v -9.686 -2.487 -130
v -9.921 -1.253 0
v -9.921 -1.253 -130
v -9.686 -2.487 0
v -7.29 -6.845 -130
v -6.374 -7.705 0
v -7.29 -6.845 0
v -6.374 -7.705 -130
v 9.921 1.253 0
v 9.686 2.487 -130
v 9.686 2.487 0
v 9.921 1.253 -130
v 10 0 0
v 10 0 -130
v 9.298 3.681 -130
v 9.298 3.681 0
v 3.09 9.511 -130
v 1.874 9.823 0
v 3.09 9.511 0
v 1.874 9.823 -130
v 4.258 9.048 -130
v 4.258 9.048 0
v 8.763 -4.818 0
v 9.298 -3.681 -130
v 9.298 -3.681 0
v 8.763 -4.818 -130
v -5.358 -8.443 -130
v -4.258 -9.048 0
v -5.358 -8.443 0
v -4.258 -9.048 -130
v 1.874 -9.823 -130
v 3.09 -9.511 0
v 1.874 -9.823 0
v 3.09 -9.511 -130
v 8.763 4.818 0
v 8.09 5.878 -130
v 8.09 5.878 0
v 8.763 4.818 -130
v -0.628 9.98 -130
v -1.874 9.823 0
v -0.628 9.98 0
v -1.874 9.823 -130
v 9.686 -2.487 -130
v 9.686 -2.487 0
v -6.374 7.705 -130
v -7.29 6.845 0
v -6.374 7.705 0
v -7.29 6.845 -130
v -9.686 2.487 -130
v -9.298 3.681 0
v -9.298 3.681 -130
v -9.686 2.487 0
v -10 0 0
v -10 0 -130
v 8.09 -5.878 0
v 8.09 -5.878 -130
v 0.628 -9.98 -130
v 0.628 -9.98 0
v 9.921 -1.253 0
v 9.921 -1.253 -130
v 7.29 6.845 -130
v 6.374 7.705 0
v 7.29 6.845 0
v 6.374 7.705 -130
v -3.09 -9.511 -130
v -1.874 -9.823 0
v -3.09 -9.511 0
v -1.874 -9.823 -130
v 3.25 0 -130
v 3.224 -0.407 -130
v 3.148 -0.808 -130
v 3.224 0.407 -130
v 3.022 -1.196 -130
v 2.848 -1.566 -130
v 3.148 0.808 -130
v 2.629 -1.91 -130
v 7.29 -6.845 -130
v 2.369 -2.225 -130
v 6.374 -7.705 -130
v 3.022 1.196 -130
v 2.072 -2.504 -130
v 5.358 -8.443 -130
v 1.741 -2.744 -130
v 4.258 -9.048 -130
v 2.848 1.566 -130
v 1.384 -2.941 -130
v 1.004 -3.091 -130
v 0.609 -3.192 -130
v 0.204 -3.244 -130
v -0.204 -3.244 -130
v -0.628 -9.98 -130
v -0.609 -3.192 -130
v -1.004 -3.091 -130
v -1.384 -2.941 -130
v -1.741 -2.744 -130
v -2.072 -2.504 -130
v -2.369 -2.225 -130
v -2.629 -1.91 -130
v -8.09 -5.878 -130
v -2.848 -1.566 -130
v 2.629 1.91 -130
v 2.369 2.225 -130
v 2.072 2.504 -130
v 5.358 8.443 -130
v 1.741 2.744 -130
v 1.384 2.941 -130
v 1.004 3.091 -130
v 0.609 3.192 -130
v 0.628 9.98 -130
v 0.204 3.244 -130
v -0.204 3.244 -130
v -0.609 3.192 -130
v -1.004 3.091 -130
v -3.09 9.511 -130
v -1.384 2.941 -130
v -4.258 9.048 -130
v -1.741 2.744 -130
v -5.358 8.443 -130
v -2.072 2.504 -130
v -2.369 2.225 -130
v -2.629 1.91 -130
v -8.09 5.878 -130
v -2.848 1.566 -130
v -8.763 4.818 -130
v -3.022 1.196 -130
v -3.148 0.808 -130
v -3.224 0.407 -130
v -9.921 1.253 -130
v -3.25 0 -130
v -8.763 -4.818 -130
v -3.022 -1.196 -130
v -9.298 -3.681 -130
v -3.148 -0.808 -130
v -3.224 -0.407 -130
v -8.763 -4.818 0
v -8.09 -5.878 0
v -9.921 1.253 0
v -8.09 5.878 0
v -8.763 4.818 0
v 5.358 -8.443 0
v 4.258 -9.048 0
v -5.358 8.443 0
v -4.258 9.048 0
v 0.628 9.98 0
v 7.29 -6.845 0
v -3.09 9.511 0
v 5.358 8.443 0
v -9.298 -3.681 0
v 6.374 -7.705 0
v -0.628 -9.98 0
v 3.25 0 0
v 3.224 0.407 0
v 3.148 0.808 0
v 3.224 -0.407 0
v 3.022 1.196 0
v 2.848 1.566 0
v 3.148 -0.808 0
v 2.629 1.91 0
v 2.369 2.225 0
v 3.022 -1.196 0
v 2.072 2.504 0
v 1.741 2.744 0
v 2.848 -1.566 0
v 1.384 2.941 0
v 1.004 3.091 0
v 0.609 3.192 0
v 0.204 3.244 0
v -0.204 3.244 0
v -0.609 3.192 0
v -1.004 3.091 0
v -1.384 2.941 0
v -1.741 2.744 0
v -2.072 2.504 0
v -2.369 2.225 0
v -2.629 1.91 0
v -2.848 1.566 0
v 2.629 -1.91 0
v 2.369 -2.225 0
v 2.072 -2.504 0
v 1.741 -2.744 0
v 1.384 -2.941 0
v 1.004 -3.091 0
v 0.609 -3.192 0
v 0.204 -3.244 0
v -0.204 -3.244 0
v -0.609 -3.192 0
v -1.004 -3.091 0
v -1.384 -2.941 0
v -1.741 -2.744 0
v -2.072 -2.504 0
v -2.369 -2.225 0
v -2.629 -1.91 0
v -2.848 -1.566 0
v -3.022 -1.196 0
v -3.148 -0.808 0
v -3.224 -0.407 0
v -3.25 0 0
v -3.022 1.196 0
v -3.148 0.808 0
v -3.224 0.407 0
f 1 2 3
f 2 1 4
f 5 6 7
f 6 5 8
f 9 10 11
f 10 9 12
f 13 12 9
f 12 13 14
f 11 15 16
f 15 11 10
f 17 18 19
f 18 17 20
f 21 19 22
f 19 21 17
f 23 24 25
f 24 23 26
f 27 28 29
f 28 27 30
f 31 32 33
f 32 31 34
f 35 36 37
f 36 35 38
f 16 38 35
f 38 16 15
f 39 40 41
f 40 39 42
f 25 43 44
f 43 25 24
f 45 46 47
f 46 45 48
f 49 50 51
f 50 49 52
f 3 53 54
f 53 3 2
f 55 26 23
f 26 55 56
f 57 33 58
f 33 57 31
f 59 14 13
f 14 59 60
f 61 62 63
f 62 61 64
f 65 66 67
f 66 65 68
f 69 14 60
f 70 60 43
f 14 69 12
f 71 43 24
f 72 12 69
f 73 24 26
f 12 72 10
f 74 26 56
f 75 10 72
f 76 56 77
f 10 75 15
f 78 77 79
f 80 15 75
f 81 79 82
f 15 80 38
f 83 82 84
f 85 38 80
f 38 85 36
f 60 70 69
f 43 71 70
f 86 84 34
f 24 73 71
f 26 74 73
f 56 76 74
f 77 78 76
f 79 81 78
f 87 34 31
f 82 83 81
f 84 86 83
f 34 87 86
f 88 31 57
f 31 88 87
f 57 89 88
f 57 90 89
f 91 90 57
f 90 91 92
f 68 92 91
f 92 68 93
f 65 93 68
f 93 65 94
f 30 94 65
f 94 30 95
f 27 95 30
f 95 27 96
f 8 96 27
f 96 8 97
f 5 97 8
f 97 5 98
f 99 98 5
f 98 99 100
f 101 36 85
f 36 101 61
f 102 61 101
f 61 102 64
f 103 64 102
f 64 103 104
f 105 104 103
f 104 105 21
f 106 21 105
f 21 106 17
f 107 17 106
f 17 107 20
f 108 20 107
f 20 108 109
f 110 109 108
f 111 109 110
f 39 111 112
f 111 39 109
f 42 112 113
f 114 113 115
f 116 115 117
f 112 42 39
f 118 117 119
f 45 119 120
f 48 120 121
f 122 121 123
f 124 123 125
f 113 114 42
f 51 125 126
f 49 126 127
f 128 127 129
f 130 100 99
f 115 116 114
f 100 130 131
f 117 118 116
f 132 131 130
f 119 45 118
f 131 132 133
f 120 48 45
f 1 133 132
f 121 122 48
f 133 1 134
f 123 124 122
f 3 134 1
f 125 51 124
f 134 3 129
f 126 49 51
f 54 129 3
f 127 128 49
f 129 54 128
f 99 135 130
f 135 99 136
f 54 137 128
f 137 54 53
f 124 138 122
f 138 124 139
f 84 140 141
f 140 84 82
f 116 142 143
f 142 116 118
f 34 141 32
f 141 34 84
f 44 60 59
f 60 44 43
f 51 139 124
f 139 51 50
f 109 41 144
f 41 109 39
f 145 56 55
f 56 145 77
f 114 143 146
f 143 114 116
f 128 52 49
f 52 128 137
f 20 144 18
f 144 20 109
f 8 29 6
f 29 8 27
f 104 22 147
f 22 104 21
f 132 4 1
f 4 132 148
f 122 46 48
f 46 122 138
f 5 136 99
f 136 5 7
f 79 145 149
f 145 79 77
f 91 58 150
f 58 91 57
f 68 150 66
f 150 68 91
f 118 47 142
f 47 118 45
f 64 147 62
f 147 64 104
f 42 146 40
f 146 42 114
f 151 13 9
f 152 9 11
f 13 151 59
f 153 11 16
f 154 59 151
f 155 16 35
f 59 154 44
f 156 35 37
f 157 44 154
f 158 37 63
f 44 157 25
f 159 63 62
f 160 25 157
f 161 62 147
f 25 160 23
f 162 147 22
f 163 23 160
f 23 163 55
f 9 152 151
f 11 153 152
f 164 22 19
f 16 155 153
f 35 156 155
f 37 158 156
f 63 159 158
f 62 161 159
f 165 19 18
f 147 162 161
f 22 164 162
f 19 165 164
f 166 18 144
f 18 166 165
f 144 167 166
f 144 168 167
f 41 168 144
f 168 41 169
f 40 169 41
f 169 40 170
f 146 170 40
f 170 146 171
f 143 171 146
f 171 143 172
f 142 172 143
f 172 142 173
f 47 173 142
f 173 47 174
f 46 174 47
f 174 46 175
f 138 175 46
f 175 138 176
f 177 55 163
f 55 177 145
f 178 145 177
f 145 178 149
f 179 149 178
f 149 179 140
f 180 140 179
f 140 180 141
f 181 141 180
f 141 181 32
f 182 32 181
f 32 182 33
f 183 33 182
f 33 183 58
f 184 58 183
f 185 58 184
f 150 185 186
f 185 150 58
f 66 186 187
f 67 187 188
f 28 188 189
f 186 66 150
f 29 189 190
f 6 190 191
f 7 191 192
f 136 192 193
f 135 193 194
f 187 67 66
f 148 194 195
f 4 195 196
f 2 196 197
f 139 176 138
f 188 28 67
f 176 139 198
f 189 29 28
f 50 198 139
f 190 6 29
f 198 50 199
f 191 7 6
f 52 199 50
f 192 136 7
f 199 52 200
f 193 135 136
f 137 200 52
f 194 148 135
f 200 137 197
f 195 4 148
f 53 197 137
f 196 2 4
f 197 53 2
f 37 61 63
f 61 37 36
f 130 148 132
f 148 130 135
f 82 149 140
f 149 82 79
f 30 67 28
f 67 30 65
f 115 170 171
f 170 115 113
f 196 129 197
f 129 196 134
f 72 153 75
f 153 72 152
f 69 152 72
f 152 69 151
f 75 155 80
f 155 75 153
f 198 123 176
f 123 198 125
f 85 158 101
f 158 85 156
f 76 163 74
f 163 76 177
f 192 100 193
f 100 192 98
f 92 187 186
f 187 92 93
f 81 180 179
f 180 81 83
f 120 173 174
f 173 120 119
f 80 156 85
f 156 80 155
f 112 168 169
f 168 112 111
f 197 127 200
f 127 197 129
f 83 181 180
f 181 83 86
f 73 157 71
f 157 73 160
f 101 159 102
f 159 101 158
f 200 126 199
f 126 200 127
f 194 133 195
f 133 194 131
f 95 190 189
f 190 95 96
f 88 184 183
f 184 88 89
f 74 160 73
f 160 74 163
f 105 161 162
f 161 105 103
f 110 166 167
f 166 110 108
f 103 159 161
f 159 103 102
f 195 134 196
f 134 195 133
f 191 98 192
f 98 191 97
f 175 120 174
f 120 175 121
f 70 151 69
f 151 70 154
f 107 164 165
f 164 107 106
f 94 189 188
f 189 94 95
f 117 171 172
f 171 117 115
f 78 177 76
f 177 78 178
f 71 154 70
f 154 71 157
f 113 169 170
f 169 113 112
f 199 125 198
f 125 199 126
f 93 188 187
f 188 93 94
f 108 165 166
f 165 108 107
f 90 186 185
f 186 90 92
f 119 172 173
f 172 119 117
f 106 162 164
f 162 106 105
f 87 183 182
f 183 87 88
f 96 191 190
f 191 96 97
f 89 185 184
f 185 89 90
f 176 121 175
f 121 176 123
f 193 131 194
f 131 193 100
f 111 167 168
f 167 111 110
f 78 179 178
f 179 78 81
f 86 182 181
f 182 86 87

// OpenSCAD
$fn = 50;


difference() {
	union() {
		translate(v = [0, 0, -130.0000000000]) {
			cylinder(h = 130, r = 10.0000000000);
		}
		cylinder(h = 0, r = 16.0000000000);
	}
	union() {
		#translate(v = [0, 0, -130]) {
			cylinder(h = 130, r = 3.2500000000);
		}
	}
}
